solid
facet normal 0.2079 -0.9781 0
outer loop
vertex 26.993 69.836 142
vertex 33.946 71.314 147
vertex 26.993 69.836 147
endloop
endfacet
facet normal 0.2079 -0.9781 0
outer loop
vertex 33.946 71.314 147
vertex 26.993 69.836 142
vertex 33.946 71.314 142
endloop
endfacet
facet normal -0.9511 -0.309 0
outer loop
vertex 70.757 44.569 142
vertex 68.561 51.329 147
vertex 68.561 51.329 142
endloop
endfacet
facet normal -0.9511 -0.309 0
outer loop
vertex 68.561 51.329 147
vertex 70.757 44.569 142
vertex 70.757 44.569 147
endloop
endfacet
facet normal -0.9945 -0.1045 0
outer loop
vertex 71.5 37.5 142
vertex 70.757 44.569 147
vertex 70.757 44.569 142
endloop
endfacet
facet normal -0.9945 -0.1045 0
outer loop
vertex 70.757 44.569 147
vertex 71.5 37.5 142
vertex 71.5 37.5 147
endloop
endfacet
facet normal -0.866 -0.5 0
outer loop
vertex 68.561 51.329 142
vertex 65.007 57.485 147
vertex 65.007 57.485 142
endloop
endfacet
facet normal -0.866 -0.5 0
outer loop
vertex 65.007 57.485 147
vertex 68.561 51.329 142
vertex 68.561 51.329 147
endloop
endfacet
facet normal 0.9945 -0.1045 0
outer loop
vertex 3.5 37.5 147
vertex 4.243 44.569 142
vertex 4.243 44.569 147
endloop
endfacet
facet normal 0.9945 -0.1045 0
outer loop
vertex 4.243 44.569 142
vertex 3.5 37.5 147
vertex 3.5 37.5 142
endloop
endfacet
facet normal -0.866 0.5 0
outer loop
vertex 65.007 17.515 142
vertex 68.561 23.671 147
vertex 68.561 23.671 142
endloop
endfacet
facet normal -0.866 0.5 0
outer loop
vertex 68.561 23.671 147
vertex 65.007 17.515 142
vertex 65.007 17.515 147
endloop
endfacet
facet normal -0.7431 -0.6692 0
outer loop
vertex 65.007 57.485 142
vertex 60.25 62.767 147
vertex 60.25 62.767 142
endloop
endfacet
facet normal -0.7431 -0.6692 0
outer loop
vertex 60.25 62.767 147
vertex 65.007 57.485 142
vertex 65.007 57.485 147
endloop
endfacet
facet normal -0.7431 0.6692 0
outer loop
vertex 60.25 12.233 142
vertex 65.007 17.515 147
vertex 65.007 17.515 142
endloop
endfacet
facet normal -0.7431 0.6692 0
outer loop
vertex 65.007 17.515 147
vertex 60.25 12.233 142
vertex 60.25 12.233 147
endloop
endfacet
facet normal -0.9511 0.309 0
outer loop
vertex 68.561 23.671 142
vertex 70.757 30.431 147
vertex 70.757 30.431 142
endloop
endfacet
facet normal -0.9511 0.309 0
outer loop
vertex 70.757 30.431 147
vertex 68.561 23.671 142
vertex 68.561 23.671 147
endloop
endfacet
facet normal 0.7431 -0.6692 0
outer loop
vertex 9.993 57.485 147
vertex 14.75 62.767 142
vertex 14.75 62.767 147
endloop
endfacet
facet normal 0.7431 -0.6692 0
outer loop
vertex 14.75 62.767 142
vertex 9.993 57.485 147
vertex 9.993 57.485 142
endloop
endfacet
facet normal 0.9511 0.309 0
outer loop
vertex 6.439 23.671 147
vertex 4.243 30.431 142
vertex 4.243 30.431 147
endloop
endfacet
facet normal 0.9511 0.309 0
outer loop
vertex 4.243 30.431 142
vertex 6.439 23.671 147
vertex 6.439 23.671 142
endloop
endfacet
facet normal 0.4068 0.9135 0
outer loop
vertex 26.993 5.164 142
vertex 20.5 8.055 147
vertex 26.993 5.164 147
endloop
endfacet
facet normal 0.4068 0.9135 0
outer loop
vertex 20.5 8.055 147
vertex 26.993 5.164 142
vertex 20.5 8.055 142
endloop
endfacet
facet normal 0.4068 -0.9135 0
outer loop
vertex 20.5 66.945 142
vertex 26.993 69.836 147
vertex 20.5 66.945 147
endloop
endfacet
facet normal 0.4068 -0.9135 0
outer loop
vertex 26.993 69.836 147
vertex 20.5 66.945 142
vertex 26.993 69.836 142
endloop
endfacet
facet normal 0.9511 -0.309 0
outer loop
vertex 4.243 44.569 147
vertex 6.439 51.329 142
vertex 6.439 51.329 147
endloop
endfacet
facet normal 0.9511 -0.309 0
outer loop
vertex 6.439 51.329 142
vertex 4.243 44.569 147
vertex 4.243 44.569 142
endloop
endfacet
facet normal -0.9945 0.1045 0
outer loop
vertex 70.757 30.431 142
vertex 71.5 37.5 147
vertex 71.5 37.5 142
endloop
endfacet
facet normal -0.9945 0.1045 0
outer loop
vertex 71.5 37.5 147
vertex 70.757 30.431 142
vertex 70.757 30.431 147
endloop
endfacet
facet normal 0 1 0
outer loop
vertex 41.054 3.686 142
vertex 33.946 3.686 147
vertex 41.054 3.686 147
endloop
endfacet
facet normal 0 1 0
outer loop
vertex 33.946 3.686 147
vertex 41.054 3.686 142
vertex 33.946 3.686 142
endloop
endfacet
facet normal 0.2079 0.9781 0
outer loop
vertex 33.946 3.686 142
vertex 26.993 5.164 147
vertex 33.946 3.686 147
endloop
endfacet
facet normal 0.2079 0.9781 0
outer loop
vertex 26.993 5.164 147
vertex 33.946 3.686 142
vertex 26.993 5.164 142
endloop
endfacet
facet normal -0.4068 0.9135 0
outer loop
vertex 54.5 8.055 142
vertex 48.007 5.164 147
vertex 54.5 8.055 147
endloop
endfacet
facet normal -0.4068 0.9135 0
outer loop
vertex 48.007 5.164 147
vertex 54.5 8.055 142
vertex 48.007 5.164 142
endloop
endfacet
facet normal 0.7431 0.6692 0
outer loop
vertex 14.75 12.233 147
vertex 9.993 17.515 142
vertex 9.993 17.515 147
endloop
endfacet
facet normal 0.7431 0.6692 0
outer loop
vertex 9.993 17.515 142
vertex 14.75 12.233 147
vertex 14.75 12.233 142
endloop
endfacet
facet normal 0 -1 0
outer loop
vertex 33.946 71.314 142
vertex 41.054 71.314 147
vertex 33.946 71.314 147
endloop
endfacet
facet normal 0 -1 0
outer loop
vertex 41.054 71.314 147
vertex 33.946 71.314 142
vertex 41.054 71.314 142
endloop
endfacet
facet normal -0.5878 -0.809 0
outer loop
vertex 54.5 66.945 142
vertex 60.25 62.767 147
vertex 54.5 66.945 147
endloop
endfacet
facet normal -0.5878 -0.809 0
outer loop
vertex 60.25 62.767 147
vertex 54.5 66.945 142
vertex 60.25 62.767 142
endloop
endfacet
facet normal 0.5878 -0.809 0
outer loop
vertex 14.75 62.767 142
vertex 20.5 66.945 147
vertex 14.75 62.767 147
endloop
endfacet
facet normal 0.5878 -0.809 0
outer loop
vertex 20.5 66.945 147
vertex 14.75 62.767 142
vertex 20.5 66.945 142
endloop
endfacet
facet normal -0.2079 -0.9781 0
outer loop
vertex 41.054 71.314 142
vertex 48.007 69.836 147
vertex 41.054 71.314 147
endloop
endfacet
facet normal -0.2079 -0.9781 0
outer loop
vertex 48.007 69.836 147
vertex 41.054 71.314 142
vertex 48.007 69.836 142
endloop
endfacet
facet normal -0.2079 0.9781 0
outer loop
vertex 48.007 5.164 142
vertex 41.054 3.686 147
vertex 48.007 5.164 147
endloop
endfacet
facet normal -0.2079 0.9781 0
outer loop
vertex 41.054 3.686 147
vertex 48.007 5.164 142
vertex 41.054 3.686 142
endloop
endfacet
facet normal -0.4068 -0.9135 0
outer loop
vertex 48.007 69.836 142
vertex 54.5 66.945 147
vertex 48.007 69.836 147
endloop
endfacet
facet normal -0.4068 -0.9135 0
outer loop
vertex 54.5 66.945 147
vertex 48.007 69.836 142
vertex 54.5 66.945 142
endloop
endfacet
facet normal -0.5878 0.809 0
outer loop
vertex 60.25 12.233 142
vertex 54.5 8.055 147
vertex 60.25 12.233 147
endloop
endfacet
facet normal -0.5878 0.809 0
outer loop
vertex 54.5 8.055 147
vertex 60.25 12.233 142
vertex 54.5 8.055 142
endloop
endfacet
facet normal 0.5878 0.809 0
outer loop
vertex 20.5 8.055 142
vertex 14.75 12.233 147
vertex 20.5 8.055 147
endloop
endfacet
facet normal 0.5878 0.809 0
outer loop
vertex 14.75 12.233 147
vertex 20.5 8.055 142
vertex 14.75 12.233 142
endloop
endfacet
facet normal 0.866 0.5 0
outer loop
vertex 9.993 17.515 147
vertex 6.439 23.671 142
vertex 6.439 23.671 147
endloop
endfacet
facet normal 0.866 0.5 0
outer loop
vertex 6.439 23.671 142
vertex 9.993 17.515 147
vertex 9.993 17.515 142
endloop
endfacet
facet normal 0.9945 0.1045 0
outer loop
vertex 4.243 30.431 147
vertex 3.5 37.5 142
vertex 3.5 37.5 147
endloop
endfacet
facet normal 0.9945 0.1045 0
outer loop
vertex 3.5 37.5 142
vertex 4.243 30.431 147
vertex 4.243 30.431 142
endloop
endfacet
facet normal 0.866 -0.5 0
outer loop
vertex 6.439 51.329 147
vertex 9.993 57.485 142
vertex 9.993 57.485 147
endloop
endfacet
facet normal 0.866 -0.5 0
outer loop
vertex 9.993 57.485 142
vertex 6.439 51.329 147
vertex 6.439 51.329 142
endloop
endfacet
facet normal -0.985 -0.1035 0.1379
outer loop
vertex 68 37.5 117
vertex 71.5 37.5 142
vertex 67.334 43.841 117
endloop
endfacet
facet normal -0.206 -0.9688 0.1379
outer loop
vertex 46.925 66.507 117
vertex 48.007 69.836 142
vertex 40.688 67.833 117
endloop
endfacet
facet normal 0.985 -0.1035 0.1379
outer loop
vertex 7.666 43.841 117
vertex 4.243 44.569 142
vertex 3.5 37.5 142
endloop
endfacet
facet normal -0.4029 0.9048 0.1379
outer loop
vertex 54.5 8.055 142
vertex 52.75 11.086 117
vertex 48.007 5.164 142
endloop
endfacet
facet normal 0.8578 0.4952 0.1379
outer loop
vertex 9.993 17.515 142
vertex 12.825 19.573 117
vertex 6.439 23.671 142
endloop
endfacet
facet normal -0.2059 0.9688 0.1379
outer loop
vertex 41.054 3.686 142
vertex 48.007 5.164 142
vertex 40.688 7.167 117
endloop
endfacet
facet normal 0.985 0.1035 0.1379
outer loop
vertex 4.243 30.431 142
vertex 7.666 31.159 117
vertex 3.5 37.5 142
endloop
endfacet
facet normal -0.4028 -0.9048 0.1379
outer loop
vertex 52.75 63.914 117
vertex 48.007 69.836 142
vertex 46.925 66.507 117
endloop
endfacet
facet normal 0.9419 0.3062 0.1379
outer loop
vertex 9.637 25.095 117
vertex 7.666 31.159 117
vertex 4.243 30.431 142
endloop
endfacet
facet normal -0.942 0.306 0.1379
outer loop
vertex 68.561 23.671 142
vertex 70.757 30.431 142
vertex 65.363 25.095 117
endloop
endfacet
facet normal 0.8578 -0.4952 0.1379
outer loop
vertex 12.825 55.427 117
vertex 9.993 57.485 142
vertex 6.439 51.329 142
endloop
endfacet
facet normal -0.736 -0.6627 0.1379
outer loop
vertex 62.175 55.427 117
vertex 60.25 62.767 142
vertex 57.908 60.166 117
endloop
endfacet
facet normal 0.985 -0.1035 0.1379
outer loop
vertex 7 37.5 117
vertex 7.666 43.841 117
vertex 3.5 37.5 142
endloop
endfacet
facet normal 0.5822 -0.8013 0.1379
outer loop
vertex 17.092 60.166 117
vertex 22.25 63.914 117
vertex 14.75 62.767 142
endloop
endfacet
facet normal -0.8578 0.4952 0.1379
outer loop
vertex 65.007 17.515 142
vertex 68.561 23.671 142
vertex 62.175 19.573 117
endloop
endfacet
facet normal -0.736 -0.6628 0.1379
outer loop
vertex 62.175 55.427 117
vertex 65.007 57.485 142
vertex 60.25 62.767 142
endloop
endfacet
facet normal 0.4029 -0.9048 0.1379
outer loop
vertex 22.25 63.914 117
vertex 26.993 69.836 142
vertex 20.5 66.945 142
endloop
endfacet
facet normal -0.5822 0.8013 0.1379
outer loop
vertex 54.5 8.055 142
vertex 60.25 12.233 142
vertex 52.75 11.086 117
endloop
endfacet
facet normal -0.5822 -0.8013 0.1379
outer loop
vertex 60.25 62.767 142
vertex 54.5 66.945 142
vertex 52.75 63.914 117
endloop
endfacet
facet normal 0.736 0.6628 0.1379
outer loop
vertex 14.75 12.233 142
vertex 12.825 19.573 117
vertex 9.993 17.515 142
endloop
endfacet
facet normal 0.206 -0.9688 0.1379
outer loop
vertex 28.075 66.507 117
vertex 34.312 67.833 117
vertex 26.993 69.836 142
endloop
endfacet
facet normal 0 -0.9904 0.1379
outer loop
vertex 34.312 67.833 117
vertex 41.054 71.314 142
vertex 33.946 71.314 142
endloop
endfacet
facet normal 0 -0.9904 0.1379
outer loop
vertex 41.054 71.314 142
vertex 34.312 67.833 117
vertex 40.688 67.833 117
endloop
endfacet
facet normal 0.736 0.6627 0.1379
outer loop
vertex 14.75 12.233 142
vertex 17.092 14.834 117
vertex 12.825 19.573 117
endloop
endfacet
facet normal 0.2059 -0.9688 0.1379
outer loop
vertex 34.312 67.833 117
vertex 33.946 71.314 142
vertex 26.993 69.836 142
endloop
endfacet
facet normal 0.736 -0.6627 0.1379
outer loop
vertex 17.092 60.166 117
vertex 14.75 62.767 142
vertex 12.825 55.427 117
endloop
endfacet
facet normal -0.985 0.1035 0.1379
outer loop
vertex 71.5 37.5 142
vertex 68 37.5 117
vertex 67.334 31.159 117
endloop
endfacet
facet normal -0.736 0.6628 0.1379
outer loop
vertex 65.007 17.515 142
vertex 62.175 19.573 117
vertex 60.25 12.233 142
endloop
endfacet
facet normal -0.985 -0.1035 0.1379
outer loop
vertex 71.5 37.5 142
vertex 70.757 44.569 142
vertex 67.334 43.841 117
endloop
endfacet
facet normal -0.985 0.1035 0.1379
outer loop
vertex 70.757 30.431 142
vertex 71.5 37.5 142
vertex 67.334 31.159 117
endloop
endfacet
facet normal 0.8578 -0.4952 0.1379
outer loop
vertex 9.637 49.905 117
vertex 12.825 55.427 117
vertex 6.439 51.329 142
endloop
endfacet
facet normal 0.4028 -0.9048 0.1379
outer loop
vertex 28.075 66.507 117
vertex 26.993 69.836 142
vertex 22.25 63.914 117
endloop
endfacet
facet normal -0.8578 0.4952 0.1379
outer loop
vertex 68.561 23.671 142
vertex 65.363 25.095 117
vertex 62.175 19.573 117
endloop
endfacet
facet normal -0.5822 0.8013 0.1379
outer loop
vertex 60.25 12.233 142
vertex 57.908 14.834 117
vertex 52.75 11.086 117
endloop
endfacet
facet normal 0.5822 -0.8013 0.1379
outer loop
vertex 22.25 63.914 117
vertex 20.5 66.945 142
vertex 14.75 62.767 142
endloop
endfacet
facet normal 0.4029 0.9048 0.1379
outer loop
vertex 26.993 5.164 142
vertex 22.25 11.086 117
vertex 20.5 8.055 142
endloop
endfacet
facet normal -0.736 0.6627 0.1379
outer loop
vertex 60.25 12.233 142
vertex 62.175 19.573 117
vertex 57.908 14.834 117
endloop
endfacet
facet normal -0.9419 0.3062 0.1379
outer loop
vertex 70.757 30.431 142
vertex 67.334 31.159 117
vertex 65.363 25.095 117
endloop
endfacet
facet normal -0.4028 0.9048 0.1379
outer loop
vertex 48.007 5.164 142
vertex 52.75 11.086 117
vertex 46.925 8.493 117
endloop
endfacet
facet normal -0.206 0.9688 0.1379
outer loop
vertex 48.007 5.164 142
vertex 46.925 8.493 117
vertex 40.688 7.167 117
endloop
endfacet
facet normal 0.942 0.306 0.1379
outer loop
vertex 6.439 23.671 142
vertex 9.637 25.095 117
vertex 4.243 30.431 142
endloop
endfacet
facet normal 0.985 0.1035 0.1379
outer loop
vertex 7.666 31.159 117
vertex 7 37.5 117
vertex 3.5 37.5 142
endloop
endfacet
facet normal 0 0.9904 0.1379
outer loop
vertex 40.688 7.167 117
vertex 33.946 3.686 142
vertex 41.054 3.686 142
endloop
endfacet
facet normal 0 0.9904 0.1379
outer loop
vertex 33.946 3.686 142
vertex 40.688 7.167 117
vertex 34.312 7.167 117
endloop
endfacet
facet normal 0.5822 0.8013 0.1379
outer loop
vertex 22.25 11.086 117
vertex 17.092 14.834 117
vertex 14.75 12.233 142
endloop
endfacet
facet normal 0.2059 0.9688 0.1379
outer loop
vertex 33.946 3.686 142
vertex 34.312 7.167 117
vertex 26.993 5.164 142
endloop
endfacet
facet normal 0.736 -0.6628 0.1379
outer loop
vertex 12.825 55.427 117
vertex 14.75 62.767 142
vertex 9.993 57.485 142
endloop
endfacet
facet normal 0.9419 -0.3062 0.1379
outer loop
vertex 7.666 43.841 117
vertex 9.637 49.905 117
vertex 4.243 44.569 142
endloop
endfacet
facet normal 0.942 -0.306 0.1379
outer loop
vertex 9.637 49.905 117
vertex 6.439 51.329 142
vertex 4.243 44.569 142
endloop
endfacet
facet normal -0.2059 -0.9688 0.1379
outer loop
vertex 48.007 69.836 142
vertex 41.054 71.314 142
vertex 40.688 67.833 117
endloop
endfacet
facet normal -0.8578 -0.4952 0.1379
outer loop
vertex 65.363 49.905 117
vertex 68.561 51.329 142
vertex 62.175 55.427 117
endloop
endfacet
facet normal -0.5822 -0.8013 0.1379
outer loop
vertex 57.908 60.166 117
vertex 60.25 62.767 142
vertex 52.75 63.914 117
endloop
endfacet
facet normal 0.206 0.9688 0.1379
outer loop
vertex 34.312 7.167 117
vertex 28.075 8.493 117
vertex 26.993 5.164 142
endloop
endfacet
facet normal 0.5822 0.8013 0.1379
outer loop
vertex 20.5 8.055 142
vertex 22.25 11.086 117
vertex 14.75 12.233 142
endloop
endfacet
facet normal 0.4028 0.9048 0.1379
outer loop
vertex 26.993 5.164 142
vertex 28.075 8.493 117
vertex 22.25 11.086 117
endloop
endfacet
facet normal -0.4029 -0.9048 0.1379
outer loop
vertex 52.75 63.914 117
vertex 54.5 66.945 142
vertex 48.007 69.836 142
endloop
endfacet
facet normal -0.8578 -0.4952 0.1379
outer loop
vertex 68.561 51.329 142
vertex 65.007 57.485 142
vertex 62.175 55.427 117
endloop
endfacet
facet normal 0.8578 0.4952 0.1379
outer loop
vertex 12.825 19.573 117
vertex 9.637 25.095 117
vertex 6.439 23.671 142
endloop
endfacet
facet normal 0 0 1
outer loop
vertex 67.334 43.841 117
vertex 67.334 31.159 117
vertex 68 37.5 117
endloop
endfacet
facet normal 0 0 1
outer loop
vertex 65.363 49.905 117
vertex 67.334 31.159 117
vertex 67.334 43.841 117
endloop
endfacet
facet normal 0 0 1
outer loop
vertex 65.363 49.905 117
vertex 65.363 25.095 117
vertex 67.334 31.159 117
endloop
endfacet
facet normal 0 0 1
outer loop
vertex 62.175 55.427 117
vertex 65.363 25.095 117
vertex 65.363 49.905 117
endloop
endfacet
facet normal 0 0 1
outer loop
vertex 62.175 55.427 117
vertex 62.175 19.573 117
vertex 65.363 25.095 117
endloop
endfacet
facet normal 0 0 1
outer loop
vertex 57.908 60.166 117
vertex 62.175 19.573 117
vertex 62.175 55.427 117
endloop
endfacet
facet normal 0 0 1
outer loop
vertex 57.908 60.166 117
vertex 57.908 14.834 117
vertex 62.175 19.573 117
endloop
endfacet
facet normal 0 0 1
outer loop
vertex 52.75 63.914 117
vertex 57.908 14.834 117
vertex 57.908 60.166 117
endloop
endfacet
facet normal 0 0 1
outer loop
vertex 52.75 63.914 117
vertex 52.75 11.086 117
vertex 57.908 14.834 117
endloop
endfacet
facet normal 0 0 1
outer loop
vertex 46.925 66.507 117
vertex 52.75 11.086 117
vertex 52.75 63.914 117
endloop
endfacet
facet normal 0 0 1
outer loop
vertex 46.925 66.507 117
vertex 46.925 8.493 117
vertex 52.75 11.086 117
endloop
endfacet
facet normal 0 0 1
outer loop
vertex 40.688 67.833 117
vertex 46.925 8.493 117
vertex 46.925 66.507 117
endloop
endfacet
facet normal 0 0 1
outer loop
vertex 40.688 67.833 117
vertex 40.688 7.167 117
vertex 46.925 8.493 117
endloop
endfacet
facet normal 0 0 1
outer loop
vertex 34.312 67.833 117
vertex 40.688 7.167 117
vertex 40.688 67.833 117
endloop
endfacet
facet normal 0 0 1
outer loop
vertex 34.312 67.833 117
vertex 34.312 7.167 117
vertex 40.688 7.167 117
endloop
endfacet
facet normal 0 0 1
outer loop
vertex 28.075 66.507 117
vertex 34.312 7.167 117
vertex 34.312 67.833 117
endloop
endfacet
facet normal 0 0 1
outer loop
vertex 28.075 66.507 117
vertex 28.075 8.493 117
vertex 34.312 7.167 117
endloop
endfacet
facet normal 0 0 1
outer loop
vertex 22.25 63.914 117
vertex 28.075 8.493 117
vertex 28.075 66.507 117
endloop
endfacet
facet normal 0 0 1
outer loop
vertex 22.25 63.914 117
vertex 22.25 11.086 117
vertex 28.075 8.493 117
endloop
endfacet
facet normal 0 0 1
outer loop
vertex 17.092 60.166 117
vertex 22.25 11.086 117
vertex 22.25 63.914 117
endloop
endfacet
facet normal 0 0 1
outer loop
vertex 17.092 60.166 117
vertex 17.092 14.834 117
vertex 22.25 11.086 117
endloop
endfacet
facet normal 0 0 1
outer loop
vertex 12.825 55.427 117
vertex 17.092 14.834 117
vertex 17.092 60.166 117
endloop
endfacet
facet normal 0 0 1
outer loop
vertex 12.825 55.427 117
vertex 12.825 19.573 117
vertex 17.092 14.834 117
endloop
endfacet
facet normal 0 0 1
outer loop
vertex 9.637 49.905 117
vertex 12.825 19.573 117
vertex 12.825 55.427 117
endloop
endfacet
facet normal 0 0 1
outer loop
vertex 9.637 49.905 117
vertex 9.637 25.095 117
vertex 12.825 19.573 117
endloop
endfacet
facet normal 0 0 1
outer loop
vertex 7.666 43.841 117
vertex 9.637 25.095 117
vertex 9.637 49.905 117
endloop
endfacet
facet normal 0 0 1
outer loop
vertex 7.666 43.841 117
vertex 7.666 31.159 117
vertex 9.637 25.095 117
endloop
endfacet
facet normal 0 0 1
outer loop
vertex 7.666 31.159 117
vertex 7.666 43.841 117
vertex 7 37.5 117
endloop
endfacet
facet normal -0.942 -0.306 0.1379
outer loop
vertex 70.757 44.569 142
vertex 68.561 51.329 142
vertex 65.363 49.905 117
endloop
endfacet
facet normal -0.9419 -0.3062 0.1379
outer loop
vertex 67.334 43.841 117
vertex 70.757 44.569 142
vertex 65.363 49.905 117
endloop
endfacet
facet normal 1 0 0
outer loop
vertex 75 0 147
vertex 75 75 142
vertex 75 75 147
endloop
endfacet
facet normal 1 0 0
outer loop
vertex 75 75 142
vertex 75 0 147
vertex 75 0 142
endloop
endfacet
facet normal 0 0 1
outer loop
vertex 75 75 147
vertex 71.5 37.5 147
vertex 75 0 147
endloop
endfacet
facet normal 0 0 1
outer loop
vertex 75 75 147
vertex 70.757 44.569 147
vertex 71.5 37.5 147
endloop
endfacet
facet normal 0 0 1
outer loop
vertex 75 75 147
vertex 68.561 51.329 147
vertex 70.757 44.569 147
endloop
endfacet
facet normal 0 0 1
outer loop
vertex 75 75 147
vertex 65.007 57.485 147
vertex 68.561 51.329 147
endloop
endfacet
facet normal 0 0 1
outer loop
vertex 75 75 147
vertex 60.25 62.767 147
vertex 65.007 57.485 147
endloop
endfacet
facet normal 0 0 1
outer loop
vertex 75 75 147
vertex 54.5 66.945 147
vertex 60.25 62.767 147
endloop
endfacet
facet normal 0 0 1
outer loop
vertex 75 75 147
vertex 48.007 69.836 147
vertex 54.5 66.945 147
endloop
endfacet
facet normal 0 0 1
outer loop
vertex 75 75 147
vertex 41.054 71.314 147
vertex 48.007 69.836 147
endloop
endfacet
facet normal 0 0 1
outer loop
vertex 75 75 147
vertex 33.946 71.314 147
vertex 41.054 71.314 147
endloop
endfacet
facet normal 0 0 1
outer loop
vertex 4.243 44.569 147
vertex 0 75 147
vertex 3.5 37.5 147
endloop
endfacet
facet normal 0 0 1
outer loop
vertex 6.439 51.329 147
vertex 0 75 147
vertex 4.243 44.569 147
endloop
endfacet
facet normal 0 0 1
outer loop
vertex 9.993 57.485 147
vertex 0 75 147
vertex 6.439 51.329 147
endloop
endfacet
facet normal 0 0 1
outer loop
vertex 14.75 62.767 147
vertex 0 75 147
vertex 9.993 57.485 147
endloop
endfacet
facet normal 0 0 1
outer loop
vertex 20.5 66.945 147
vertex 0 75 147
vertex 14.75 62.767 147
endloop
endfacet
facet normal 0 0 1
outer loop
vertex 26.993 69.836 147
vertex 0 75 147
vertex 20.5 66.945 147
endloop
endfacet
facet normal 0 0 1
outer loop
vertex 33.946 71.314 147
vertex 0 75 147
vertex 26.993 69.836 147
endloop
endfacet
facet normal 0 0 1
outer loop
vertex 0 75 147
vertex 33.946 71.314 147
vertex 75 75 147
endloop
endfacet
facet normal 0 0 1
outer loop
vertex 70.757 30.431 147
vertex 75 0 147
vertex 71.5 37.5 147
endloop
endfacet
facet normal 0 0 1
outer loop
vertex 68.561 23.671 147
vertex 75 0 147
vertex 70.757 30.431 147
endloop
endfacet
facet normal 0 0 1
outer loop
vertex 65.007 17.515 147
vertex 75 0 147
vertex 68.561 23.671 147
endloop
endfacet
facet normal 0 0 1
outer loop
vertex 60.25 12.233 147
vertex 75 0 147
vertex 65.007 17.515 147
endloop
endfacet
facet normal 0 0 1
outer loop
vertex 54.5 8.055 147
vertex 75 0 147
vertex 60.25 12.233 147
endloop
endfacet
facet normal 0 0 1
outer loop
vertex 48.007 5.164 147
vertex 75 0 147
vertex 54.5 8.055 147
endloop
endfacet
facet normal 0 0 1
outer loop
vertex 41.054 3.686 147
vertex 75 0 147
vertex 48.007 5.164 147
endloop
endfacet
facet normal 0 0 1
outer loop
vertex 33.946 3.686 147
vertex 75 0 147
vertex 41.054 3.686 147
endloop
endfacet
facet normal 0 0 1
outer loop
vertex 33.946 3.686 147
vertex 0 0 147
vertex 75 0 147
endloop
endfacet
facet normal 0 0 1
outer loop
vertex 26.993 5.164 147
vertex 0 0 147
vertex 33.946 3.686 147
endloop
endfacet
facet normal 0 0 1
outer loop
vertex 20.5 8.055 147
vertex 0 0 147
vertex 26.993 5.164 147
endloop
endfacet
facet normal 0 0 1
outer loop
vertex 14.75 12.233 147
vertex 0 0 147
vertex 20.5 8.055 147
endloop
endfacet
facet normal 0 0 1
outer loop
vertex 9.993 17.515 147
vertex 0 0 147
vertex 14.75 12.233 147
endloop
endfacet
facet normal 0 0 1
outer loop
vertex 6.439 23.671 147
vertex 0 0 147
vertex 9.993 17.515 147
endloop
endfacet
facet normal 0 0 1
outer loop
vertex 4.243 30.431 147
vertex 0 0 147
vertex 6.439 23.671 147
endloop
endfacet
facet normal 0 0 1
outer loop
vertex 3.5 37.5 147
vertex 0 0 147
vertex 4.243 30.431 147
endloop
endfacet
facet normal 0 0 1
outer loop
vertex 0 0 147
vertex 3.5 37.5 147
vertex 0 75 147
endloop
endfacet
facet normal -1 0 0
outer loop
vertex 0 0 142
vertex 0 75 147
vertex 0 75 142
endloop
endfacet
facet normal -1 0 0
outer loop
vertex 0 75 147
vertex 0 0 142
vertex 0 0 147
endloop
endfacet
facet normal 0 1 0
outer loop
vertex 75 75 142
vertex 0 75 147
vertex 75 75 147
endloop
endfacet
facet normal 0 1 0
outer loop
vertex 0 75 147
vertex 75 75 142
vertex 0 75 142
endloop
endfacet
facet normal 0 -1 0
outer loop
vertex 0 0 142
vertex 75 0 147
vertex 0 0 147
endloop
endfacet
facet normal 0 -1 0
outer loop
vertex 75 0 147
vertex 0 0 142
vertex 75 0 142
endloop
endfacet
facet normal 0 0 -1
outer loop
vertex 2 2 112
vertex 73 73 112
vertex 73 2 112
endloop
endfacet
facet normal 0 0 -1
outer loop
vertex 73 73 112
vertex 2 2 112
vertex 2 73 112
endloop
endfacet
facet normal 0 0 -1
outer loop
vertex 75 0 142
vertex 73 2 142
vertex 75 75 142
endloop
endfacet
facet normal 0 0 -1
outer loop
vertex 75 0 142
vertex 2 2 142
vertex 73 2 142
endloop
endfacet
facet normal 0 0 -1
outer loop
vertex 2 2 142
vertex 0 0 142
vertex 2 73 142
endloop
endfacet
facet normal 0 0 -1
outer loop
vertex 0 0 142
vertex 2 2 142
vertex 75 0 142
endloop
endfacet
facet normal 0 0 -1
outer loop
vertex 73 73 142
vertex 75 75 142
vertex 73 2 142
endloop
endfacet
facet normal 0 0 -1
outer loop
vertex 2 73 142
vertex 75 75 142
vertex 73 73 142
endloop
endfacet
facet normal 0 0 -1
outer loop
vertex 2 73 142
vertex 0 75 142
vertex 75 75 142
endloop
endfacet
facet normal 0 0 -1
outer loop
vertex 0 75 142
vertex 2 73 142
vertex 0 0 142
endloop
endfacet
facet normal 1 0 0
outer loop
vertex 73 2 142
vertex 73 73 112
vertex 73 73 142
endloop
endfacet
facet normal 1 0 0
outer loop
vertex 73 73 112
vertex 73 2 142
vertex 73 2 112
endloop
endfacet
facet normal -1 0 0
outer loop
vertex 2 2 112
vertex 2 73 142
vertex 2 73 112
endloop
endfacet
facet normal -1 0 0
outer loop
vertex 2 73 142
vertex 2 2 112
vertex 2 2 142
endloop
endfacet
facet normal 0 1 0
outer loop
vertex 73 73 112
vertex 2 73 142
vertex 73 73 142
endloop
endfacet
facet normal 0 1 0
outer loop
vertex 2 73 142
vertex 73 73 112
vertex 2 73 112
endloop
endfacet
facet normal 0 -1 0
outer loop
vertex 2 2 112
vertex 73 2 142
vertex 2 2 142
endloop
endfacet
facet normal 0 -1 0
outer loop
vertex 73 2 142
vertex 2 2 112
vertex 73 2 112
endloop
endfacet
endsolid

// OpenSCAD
//Gartenlicht

aussen=75;
innen=71; //72
hoehe=142;

oben=68;
unten=61;
laenge_zylinder=25;
laenge_kerze=140;

mt=(aussen-innen)/2;

t=5;

module Metal() {
    difference() {
        cube([aussen, aussen, hoehe]);
    }
}

module Metal_hohl() {
    difference() {
        cube([aussen, aussen, hoehe]);
    translate([mt,mt,0])
    cube([innen, innen, hoehe]);
    }
}

//Metal();

module Kerze() {
    translate([(aussen)/2,(aussen)/2,hoehe])
    cylinder(h=laenge_kerze-laenge_zylinder, d=oben);
    
    color("green")
    translate([(aussen)/2,(aussen)/2,hoehe-laenge_zylinder])
    cylinder(h=laenge_zylinder, d2=oben, d1=unten);
}

//Kerze();

module deckel() {        
    translate([0,0,hoehe-laenge_zylinder-t])
    cube([aussen, aussen, laenge_zylinder+t*2]);
}

module a() {
difference() {
    deckel();
    Kerze();
    Metal();
}
    
difference() {
    deckel();
    Kerze();
}
}

s=1;
scale([s,s,s])
{
difference() {
a();Metal_hohl(); }
    }
